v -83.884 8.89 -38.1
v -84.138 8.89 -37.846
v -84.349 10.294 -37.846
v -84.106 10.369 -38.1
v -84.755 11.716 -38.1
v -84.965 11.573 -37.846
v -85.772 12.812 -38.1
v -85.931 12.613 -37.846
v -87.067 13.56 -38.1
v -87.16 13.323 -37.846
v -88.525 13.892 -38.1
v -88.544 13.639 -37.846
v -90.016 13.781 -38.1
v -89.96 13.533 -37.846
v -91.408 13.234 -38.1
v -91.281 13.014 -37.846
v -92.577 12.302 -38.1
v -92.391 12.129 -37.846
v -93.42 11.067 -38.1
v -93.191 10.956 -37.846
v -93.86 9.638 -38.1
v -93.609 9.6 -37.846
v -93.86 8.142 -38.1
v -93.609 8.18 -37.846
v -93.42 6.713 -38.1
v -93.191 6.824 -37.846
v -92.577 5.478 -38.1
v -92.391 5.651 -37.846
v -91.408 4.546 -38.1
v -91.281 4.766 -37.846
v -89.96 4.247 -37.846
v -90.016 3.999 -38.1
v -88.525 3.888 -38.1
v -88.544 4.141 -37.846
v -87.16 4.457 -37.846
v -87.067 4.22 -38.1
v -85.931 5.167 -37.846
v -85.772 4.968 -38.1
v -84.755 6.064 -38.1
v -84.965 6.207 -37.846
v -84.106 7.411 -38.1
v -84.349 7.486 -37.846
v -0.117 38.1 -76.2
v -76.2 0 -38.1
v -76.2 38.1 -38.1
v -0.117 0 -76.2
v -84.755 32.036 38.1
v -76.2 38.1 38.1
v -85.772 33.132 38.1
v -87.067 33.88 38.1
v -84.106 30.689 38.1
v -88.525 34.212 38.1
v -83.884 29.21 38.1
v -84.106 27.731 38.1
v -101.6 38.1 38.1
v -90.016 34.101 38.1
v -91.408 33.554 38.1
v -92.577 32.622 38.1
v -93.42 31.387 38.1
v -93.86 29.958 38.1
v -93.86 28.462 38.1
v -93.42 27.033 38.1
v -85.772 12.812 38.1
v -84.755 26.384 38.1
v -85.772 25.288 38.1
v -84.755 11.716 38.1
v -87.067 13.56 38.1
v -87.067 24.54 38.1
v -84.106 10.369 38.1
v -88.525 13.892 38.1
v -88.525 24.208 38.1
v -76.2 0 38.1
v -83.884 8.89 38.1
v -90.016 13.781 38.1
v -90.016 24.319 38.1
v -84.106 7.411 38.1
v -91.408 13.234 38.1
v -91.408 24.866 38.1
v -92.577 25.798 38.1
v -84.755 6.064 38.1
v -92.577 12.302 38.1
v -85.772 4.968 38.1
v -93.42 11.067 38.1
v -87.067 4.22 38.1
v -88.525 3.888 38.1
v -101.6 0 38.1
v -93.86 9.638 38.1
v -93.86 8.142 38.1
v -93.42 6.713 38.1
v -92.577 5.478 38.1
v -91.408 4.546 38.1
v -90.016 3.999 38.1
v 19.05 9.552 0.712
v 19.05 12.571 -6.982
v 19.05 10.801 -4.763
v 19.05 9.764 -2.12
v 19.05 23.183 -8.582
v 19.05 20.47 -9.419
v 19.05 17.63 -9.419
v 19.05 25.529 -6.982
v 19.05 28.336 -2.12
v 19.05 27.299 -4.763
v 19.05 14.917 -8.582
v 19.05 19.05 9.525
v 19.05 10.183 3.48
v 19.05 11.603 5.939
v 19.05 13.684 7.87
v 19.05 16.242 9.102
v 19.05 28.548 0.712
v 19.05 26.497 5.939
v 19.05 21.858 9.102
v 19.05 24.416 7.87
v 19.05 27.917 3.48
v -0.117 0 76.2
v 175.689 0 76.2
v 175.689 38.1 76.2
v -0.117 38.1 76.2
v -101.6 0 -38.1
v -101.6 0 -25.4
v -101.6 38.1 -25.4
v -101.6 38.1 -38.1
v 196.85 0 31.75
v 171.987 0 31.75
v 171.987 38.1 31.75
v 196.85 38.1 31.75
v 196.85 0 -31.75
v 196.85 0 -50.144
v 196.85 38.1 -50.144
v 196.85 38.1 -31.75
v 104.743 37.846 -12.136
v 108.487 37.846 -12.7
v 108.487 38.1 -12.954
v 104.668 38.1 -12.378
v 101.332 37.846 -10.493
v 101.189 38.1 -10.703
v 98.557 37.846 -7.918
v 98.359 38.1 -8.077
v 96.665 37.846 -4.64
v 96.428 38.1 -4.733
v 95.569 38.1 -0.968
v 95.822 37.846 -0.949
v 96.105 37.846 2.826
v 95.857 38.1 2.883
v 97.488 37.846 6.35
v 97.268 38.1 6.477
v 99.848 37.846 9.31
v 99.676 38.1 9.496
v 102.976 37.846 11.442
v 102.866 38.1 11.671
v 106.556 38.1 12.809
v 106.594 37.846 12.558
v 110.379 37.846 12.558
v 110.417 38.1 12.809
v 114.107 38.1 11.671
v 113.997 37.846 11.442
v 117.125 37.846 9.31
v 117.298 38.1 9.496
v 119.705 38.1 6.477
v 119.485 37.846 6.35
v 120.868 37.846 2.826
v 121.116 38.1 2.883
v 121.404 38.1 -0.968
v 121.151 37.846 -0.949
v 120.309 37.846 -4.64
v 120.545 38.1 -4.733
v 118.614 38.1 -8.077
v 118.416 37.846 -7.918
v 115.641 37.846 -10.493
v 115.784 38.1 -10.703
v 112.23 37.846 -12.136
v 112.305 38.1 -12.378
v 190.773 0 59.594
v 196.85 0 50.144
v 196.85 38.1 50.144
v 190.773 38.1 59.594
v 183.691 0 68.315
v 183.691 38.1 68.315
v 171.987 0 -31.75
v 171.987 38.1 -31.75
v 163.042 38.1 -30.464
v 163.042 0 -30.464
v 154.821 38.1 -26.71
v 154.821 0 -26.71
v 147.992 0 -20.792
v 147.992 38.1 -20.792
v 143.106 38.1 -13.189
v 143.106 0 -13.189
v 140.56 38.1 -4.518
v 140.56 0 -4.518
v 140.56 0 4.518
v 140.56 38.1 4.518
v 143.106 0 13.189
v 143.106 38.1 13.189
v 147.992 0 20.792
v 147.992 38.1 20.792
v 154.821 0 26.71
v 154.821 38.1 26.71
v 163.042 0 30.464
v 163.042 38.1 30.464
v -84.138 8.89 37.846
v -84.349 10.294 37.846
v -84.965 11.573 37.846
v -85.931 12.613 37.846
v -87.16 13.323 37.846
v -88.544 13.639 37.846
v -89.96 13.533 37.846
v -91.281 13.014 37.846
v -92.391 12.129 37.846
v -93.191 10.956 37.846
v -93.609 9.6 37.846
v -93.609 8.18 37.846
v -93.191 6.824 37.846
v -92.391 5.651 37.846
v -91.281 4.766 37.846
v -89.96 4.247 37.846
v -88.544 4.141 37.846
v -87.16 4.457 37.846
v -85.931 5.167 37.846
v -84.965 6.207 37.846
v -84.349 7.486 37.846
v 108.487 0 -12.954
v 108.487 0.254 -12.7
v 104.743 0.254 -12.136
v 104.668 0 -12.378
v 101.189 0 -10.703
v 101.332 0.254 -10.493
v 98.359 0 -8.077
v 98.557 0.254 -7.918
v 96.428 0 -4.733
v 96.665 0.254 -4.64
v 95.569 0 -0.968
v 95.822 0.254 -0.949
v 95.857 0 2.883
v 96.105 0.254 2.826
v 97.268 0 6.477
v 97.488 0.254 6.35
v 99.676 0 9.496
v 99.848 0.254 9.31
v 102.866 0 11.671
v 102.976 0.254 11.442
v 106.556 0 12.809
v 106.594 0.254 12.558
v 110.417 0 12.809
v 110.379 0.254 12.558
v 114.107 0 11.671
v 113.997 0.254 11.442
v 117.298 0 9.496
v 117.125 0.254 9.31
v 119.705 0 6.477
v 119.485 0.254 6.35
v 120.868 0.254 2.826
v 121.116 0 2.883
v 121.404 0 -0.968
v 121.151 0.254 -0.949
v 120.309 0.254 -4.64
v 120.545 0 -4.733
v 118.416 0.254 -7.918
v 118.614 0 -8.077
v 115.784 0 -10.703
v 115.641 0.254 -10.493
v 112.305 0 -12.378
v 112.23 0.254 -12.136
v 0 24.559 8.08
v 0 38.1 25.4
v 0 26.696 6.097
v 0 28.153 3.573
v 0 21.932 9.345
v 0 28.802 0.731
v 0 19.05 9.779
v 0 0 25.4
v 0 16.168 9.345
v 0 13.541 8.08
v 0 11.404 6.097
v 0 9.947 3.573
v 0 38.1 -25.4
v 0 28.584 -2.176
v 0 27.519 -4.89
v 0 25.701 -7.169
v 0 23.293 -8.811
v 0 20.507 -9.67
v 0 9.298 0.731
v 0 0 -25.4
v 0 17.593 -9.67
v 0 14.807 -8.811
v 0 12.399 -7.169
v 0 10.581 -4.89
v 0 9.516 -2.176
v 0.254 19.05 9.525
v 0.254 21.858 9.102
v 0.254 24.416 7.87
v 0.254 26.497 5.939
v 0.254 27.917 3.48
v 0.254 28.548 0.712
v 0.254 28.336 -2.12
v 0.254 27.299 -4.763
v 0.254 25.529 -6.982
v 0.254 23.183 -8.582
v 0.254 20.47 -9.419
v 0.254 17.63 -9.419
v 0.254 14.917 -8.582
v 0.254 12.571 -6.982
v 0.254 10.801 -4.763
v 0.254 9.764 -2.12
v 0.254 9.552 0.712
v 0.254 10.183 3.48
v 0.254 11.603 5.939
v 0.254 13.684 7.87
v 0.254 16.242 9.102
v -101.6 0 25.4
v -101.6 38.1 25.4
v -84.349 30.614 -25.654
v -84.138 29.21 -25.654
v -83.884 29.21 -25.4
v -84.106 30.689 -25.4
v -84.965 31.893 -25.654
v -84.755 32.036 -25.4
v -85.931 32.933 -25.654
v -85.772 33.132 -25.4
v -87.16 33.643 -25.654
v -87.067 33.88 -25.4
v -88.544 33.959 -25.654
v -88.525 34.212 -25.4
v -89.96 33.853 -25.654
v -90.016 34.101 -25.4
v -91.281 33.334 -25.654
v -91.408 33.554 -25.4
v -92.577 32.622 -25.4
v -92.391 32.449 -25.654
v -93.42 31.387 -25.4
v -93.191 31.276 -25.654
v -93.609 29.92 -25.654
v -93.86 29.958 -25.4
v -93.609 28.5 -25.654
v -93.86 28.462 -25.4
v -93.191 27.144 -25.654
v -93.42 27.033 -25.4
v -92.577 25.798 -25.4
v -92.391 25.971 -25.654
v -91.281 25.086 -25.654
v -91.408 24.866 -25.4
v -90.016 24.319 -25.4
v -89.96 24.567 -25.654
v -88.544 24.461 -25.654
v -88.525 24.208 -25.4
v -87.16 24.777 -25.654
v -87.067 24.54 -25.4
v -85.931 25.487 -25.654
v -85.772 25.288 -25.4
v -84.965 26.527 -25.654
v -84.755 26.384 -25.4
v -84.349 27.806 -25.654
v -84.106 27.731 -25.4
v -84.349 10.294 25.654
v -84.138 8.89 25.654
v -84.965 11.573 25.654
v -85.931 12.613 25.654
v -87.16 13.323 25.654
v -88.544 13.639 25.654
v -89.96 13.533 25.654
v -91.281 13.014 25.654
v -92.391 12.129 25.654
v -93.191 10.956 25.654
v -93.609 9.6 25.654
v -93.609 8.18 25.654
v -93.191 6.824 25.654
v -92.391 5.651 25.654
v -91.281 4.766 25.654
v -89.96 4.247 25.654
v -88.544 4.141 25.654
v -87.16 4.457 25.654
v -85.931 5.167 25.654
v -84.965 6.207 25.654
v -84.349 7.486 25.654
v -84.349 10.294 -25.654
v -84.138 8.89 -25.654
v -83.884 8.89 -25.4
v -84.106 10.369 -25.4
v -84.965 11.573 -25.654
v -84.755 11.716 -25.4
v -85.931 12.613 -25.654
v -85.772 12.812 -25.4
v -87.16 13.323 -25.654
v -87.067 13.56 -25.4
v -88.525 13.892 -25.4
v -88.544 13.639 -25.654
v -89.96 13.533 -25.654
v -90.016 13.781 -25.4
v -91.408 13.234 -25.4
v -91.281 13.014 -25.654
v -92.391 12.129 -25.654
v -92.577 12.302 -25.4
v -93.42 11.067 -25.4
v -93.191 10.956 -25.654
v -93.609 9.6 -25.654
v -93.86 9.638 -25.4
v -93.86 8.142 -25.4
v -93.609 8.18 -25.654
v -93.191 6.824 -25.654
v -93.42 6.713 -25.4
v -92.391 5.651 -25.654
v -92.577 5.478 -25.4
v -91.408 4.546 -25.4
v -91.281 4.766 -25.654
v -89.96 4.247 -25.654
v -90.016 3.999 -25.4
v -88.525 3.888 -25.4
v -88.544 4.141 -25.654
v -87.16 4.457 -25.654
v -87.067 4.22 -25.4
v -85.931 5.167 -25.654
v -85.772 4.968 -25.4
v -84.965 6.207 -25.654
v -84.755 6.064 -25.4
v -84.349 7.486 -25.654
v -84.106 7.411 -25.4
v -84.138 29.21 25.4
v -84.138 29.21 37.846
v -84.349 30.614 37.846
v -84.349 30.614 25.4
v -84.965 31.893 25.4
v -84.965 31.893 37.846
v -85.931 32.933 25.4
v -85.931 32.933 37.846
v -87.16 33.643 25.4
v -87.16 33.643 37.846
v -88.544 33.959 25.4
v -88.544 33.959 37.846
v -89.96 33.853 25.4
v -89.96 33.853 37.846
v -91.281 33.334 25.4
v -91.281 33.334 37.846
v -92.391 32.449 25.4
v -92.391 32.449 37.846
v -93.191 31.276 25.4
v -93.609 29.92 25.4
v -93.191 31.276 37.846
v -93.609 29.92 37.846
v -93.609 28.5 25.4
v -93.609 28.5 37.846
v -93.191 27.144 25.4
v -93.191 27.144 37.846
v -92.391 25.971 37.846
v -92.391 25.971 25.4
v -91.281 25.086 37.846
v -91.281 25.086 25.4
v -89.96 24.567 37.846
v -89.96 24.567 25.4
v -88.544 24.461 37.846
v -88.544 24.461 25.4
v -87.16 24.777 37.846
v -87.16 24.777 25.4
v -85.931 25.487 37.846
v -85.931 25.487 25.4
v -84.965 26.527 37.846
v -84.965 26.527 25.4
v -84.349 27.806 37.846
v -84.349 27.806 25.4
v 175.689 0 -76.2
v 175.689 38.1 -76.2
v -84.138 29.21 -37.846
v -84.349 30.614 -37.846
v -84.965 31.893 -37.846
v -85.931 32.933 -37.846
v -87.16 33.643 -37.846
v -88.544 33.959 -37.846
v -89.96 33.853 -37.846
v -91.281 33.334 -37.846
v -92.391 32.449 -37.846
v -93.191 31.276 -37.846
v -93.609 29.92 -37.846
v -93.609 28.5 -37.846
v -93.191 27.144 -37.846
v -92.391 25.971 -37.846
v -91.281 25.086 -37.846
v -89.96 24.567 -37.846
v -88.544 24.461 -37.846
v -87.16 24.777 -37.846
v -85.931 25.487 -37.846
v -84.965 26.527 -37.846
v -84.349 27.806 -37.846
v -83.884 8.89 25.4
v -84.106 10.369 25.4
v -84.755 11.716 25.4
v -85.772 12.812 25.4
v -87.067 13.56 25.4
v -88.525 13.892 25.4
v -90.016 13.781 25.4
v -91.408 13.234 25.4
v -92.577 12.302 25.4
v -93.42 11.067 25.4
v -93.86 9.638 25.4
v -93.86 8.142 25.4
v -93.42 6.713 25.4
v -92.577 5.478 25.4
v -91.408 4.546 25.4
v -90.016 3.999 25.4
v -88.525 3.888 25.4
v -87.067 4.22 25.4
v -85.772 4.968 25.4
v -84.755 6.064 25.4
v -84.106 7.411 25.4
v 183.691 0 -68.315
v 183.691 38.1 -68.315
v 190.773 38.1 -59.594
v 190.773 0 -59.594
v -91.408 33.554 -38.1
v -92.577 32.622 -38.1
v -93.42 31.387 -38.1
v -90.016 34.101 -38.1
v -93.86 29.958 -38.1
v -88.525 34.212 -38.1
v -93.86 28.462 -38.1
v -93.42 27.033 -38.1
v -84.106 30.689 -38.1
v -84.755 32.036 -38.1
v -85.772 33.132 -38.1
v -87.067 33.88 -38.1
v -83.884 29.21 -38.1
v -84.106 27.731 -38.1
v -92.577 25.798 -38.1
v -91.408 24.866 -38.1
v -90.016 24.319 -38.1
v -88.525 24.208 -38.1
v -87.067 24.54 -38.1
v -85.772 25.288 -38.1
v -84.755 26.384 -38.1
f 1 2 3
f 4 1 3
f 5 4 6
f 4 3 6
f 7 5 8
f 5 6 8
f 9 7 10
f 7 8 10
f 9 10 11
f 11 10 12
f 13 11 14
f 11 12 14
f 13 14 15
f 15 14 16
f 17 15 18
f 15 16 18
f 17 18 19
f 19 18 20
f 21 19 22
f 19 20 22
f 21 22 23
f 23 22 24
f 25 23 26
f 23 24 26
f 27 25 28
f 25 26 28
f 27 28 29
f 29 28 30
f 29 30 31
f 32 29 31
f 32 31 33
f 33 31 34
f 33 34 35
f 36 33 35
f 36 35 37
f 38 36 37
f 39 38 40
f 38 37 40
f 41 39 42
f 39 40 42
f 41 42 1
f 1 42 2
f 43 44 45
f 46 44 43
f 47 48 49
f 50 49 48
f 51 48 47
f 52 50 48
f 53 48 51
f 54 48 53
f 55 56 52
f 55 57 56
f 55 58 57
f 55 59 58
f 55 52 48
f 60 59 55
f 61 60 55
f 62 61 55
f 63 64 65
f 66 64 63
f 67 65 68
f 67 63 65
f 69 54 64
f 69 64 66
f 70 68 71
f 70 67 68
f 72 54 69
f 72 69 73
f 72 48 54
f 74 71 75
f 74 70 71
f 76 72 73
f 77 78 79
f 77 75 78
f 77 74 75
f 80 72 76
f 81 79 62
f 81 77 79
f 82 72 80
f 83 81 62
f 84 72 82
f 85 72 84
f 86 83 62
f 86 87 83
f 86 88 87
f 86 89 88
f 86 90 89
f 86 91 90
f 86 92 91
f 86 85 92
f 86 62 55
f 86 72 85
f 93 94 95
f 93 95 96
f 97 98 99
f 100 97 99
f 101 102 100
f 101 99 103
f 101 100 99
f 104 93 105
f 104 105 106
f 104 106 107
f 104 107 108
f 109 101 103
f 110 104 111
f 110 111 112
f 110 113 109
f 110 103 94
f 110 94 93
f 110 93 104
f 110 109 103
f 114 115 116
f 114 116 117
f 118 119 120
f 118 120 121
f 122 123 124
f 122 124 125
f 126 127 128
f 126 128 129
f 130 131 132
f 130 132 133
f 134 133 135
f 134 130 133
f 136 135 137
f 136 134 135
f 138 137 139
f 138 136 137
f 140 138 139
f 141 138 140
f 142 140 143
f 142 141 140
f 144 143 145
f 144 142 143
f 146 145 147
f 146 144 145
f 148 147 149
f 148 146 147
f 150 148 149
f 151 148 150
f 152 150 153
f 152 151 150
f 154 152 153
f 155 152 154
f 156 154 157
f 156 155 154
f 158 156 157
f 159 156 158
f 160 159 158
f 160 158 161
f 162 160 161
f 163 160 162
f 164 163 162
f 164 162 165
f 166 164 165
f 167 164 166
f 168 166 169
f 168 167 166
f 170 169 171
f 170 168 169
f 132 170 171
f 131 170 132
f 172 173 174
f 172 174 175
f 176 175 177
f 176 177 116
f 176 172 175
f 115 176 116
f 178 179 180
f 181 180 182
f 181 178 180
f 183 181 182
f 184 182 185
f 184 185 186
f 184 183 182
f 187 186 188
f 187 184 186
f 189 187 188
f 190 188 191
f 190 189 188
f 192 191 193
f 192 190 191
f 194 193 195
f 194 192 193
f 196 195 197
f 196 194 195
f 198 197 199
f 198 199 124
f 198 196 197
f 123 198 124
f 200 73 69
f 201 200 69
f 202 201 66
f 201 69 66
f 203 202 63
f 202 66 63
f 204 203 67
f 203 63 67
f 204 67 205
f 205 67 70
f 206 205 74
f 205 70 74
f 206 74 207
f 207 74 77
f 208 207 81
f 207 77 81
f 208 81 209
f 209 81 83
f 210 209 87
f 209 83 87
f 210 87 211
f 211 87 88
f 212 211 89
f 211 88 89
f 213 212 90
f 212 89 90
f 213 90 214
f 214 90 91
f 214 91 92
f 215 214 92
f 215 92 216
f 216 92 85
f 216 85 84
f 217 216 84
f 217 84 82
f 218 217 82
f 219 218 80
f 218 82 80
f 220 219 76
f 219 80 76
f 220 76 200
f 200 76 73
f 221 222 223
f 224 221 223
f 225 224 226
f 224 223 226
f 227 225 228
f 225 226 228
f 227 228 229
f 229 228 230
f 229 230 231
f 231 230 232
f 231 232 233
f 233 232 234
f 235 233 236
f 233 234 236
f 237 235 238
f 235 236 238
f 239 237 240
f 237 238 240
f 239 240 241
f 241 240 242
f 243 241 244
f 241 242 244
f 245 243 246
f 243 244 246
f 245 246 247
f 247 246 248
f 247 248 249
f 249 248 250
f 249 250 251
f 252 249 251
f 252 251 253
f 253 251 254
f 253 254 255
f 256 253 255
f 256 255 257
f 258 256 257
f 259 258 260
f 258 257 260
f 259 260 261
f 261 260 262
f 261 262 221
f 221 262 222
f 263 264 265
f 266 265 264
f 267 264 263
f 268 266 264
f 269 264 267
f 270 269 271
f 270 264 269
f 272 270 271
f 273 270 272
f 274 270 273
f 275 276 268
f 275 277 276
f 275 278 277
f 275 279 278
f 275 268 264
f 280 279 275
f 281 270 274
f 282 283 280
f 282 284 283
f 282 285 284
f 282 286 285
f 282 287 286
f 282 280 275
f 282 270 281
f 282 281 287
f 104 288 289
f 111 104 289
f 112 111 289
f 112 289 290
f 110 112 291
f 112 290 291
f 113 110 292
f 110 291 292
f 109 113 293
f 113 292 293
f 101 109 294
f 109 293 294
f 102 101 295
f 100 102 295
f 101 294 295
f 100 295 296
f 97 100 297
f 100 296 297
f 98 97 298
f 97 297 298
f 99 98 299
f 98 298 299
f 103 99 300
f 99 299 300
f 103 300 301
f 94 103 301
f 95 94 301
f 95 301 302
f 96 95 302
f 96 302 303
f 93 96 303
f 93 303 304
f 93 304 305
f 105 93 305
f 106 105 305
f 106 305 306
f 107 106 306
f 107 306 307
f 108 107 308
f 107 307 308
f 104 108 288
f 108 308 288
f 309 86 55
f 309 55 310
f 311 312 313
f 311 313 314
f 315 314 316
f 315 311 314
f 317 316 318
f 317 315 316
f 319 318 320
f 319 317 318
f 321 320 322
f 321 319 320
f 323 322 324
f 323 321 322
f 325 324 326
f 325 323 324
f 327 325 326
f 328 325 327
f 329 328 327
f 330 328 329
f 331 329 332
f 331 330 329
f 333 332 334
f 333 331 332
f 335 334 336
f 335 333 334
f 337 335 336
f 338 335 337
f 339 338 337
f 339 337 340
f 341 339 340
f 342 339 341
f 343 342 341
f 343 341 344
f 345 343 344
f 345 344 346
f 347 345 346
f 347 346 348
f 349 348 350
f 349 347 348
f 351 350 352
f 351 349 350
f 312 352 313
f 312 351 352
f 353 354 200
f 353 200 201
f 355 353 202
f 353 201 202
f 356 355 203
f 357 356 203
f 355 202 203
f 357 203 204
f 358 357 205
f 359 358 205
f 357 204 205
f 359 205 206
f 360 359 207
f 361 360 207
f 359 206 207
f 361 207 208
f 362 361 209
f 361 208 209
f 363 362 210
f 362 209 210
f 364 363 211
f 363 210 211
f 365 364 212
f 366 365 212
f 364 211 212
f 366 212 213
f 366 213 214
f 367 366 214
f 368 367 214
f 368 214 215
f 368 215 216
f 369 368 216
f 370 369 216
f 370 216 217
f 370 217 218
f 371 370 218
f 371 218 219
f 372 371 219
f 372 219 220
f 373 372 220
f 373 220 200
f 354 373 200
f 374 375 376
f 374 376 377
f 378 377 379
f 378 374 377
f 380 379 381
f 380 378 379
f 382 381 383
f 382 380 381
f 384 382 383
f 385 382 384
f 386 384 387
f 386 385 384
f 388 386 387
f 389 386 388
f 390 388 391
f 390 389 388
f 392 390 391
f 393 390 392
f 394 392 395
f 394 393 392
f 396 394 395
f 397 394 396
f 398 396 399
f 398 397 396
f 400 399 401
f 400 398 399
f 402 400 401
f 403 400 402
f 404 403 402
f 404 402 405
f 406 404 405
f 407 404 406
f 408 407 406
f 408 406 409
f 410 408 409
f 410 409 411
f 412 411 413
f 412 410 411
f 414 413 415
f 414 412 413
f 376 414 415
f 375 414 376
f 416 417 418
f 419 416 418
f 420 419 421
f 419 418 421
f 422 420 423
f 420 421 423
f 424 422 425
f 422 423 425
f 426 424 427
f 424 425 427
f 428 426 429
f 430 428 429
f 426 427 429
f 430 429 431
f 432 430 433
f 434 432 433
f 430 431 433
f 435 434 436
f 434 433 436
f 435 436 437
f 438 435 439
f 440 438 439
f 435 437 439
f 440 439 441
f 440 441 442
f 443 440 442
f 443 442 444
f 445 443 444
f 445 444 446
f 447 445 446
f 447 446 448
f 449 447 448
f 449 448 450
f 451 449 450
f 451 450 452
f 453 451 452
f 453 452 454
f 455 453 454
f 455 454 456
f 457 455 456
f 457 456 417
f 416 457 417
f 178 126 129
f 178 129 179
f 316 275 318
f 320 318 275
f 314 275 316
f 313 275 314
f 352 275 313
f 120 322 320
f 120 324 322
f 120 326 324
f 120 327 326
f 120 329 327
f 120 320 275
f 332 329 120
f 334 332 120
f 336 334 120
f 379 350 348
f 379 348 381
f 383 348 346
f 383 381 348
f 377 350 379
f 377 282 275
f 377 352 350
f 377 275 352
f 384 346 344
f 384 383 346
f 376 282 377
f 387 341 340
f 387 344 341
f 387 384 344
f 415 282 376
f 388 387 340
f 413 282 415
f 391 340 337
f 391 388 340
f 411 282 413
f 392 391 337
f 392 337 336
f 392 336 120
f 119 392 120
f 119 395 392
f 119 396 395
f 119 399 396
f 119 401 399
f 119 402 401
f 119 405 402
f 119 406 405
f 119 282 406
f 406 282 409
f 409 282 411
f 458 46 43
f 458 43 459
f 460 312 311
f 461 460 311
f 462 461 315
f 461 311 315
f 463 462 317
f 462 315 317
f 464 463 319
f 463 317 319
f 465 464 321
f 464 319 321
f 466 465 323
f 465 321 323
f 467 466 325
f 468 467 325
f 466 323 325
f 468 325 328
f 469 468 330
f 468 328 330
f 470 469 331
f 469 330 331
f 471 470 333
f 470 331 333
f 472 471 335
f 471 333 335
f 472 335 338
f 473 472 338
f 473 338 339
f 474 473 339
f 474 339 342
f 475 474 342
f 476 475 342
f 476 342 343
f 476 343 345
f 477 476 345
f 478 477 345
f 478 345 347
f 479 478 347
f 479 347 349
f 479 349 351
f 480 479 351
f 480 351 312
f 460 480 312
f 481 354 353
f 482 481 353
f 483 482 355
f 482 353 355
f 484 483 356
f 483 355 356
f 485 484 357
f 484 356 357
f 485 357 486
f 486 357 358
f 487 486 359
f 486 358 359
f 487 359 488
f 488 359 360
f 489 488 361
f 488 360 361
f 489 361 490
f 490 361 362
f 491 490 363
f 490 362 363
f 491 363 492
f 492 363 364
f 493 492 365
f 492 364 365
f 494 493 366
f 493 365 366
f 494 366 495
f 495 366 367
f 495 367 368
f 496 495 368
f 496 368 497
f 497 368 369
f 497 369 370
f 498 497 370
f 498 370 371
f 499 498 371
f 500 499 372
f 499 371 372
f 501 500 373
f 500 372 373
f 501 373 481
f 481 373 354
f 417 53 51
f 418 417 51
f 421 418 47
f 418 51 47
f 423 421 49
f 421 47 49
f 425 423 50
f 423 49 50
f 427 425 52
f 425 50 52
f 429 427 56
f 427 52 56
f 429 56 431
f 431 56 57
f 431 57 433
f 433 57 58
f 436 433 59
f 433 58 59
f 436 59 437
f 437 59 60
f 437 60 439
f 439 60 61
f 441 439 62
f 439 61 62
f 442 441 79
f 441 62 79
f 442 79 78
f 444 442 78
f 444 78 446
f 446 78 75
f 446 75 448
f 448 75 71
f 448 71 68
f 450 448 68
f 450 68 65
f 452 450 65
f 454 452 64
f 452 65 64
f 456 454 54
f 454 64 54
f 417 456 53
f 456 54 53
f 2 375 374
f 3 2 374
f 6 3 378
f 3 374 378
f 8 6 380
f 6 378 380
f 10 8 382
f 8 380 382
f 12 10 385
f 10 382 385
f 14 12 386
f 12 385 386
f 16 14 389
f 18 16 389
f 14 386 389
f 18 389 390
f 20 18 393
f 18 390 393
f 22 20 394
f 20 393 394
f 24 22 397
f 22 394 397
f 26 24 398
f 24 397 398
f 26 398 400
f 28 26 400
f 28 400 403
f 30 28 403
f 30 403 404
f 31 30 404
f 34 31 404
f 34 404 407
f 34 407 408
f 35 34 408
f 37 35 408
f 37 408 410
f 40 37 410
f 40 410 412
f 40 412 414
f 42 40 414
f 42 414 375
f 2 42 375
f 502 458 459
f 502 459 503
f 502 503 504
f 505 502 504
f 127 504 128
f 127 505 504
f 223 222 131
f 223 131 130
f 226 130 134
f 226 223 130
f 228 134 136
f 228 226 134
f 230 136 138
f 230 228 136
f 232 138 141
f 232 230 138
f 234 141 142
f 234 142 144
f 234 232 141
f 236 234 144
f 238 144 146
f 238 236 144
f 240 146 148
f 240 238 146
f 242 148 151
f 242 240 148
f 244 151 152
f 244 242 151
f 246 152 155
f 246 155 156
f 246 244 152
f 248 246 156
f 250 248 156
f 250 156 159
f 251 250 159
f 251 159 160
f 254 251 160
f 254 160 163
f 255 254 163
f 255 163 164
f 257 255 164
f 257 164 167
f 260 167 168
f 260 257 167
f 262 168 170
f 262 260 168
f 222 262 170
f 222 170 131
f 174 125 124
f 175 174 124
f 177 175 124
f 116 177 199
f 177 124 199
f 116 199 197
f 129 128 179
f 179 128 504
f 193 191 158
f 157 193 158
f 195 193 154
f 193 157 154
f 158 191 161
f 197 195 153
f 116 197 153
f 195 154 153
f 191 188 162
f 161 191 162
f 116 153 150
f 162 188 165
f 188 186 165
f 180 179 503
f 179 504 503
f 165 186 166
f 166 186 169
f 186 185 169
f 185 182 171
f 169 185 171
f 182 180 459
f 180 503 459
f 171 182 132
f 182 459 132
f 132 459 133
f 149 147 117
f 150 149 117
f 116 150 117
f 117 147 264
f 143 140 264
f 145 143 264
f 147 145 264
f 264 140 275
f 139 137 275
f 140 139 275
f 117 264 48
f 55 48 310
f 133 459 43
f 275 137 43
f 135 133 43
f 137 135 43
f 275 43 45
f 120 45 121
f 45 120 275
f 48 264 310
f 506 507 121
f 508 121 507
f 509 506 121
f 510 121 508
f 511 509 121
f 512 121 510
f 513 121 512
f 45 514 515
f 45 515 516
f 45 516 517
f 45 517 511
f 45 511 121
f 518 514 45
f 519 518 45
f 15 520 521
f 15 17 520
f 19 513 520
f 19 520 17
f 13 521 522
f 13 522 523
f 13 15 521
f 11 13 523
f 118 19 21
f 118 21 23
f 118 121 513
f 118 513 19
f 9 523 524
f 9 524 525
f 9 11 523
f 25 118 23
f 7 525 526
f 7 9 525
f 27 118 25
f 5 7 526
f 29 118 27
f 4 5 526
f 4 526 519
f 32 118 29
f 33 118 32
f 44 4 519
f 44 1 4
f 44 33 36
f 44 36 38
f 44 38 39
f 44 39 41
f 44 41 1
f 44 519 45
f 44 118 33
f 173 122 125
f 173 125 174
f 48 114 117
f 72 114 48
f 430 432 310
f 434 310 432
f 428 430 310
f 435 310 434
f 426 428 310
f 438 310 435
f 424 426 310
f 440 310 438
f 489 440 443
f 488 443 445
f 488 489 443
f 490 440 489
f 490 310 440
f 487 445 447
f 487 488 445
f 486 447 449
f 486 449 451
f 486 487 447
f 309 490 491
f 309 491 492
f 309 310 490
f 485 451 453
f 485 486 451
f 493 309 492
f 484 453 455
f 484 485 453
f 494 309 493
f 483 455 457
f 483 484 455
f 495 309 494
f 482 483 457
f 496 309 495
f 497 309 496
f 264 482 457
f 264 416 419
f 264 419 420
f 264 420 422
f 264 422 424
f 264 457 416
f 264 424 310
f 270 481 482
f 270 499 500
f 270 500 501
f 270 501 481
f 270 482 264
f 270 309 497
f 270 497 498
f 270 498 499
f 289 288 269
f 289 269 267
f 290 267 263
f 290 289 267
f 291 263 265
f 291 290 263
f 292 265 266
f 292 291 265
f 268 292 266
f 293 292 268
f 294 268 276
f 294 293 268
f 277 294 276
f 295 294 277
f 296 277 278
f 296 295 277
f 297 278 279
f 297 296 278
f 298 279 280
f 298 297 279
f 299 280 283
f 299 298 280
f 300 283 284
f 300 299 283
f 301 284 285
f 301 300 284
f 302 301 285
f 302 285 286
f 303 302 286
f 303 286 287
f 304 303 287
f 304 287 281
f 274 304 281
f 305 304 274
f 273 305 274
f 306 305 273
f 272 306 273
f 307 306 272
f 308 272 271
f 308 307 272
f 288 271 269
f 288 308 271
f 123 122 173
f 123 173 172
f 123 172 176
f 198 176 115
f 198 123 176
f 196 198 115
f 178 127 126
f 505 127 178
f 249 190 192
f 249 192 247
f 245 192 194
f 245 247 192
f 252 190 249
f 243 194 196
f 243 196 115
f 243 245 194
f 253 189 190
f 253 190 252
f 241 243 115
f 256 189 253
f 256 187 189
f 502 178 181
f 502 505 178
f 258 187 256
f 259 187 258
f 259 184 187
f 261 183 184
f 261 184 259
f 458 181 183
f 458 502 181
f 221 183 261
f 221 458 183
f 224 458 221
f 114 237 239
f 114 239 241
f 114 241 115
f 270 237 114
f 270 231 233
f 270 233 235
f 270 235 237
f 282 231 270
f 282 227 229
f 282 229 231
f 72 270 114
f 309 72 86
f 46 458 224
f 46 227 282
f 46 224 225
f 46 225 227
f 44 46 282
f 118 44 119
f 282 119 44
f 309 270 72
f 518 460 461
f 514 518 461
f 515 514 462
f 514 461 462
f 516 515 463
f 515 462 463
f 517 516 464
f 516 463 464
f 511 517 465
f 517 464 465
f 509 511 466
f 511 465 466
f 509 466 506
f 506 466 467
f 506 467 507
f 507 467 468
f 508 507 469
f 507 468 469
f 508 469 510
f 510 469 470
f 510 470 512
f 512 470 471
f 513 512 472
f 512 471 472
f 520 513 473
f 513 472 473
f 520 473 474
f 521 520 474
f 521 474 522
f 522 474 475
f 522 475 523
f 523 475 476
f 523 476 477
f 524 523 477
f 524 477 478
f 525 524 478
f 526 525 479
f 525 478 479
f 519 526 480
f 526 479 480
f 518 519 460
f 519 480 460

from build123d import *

# Parameters (mm, degrees)
SKETCH2_R           = 12.7
BOSS_EXTRUDE1_DEPTH = 38.1
SKETCH4_R           = 9.525
CUT_EXTRUDE1_DEPTH  = 19.05
SKETCH5_R           = 4.7625
CUT_EXTRUDE2_DEPTH  = 231.794329436
CHAMFER1_SIZE       = 0.254


with BuildPart() as part:
    # Sketch2 → Boss-Extrude1 (new body)
    with BuildSketch(Plane(origin=(0, 0, 0), x_dir=(1, 0, 0), z_dir=(0, 1, 0))):
        with BuildLine():
            Line((0, -25.4), (0, 25.4))
            Line((0, 25.4), (-101.6, 25.4))
            Line((-101.6, 25.4), (-101.6, 38.1))
            Line((-101.6, 38.1), (-76.2, 38.1))
            Line((-76.2, 38.1), (-0.116505732, 76.2))
            Line((-0.116505732, 76.2), (175.688681182, 76.2))
            ThreePointArc((175.688681182, 76.2), (187.352798222, 64.052185316), (196.85, 50.144482907))
            Line((196.85, 50.144482907), (196.85, 31.75))
            Line((196.85, 31.75), (171.986597881, 31.75))
            ThreePointArc((171.986597881, 31.75), (140.236597881, 0), (171.986597881, -31.75))
            Line((171.986597881, -31.75), (196.85, -31.75))
            Line((196.85, -31.75), (196.85, -50.144482907))
            ThreePointArc((196.85, -50.144482907), (187.352798222, -64.052185316), (175.688681182, -76.2))
            Line((175.688681182, -76.2), (-0.116505732, -76.2))
            Line((-0.116505732, -76.2), (-76.2, -38.1))
            Line((-76.2, -38.1), (-101.6, -38.1))
            Line((-101.6, -38.1), (-101.6, -25.4))
            Line((-101.6, -25.4), (0, -25.4))
        make_face()
        with Locations(Location((108.486597881, 0, 0), (0, 0, 90))):
            Circle(SKETCH2_R, mode=Mode.SUBTRACT)
    extrude(amount=BOSS_EXTRUDE1_DEPTH)

    # Sketch4 → Cut-Extrude1 (cut)
    with BuildSketch(Plane.ZY):
        with Locations((0, 19.05)):
            Circle(SKETCH4_R)
    extrude(amount=-CUT_EXTRUDE1_DEPTH, mode=Mode.SUBTRACT)

    # Sketch5 → Cut-Extrude2 (cut, through all)
    with BuildSketch(Plane.XY.offset(38.1)):
        with Locations((-88.9, 29.21)):
            Circle(SKETCH5_R)
        with Locations((-88.9, 8.89)):
            Circle(SKETCH5_R)
    extrude(amount=-CUT_EXTRUDE2_DEPTH, mode=Mode.SUBTRACT)

    # Chamfer1
    chamfer1_edges = [part.edges().sort_by_distance(p)[0] for p in [
        (108.486597881, 0, 12.7),
        (108.486597881, 38.1, 12.7),
        (0, 19.05, -9.525),
        (-93.6625, 29.21, -38.1),
        (-93.6625, 29.21, -25.4),
        (-93.6625, 29.21, 38.1),
        (-93.6625, 8.89, -38.1),
        (-93.6625, 8.89, -25.4),
        (-93.6625, 8.89, 25.4),
        (-93.6625, 8.89, 38.1),
    ]]
    chamfer(chamfer1_edges, length=CHAMFER1_SIZE)


solid = part.part
